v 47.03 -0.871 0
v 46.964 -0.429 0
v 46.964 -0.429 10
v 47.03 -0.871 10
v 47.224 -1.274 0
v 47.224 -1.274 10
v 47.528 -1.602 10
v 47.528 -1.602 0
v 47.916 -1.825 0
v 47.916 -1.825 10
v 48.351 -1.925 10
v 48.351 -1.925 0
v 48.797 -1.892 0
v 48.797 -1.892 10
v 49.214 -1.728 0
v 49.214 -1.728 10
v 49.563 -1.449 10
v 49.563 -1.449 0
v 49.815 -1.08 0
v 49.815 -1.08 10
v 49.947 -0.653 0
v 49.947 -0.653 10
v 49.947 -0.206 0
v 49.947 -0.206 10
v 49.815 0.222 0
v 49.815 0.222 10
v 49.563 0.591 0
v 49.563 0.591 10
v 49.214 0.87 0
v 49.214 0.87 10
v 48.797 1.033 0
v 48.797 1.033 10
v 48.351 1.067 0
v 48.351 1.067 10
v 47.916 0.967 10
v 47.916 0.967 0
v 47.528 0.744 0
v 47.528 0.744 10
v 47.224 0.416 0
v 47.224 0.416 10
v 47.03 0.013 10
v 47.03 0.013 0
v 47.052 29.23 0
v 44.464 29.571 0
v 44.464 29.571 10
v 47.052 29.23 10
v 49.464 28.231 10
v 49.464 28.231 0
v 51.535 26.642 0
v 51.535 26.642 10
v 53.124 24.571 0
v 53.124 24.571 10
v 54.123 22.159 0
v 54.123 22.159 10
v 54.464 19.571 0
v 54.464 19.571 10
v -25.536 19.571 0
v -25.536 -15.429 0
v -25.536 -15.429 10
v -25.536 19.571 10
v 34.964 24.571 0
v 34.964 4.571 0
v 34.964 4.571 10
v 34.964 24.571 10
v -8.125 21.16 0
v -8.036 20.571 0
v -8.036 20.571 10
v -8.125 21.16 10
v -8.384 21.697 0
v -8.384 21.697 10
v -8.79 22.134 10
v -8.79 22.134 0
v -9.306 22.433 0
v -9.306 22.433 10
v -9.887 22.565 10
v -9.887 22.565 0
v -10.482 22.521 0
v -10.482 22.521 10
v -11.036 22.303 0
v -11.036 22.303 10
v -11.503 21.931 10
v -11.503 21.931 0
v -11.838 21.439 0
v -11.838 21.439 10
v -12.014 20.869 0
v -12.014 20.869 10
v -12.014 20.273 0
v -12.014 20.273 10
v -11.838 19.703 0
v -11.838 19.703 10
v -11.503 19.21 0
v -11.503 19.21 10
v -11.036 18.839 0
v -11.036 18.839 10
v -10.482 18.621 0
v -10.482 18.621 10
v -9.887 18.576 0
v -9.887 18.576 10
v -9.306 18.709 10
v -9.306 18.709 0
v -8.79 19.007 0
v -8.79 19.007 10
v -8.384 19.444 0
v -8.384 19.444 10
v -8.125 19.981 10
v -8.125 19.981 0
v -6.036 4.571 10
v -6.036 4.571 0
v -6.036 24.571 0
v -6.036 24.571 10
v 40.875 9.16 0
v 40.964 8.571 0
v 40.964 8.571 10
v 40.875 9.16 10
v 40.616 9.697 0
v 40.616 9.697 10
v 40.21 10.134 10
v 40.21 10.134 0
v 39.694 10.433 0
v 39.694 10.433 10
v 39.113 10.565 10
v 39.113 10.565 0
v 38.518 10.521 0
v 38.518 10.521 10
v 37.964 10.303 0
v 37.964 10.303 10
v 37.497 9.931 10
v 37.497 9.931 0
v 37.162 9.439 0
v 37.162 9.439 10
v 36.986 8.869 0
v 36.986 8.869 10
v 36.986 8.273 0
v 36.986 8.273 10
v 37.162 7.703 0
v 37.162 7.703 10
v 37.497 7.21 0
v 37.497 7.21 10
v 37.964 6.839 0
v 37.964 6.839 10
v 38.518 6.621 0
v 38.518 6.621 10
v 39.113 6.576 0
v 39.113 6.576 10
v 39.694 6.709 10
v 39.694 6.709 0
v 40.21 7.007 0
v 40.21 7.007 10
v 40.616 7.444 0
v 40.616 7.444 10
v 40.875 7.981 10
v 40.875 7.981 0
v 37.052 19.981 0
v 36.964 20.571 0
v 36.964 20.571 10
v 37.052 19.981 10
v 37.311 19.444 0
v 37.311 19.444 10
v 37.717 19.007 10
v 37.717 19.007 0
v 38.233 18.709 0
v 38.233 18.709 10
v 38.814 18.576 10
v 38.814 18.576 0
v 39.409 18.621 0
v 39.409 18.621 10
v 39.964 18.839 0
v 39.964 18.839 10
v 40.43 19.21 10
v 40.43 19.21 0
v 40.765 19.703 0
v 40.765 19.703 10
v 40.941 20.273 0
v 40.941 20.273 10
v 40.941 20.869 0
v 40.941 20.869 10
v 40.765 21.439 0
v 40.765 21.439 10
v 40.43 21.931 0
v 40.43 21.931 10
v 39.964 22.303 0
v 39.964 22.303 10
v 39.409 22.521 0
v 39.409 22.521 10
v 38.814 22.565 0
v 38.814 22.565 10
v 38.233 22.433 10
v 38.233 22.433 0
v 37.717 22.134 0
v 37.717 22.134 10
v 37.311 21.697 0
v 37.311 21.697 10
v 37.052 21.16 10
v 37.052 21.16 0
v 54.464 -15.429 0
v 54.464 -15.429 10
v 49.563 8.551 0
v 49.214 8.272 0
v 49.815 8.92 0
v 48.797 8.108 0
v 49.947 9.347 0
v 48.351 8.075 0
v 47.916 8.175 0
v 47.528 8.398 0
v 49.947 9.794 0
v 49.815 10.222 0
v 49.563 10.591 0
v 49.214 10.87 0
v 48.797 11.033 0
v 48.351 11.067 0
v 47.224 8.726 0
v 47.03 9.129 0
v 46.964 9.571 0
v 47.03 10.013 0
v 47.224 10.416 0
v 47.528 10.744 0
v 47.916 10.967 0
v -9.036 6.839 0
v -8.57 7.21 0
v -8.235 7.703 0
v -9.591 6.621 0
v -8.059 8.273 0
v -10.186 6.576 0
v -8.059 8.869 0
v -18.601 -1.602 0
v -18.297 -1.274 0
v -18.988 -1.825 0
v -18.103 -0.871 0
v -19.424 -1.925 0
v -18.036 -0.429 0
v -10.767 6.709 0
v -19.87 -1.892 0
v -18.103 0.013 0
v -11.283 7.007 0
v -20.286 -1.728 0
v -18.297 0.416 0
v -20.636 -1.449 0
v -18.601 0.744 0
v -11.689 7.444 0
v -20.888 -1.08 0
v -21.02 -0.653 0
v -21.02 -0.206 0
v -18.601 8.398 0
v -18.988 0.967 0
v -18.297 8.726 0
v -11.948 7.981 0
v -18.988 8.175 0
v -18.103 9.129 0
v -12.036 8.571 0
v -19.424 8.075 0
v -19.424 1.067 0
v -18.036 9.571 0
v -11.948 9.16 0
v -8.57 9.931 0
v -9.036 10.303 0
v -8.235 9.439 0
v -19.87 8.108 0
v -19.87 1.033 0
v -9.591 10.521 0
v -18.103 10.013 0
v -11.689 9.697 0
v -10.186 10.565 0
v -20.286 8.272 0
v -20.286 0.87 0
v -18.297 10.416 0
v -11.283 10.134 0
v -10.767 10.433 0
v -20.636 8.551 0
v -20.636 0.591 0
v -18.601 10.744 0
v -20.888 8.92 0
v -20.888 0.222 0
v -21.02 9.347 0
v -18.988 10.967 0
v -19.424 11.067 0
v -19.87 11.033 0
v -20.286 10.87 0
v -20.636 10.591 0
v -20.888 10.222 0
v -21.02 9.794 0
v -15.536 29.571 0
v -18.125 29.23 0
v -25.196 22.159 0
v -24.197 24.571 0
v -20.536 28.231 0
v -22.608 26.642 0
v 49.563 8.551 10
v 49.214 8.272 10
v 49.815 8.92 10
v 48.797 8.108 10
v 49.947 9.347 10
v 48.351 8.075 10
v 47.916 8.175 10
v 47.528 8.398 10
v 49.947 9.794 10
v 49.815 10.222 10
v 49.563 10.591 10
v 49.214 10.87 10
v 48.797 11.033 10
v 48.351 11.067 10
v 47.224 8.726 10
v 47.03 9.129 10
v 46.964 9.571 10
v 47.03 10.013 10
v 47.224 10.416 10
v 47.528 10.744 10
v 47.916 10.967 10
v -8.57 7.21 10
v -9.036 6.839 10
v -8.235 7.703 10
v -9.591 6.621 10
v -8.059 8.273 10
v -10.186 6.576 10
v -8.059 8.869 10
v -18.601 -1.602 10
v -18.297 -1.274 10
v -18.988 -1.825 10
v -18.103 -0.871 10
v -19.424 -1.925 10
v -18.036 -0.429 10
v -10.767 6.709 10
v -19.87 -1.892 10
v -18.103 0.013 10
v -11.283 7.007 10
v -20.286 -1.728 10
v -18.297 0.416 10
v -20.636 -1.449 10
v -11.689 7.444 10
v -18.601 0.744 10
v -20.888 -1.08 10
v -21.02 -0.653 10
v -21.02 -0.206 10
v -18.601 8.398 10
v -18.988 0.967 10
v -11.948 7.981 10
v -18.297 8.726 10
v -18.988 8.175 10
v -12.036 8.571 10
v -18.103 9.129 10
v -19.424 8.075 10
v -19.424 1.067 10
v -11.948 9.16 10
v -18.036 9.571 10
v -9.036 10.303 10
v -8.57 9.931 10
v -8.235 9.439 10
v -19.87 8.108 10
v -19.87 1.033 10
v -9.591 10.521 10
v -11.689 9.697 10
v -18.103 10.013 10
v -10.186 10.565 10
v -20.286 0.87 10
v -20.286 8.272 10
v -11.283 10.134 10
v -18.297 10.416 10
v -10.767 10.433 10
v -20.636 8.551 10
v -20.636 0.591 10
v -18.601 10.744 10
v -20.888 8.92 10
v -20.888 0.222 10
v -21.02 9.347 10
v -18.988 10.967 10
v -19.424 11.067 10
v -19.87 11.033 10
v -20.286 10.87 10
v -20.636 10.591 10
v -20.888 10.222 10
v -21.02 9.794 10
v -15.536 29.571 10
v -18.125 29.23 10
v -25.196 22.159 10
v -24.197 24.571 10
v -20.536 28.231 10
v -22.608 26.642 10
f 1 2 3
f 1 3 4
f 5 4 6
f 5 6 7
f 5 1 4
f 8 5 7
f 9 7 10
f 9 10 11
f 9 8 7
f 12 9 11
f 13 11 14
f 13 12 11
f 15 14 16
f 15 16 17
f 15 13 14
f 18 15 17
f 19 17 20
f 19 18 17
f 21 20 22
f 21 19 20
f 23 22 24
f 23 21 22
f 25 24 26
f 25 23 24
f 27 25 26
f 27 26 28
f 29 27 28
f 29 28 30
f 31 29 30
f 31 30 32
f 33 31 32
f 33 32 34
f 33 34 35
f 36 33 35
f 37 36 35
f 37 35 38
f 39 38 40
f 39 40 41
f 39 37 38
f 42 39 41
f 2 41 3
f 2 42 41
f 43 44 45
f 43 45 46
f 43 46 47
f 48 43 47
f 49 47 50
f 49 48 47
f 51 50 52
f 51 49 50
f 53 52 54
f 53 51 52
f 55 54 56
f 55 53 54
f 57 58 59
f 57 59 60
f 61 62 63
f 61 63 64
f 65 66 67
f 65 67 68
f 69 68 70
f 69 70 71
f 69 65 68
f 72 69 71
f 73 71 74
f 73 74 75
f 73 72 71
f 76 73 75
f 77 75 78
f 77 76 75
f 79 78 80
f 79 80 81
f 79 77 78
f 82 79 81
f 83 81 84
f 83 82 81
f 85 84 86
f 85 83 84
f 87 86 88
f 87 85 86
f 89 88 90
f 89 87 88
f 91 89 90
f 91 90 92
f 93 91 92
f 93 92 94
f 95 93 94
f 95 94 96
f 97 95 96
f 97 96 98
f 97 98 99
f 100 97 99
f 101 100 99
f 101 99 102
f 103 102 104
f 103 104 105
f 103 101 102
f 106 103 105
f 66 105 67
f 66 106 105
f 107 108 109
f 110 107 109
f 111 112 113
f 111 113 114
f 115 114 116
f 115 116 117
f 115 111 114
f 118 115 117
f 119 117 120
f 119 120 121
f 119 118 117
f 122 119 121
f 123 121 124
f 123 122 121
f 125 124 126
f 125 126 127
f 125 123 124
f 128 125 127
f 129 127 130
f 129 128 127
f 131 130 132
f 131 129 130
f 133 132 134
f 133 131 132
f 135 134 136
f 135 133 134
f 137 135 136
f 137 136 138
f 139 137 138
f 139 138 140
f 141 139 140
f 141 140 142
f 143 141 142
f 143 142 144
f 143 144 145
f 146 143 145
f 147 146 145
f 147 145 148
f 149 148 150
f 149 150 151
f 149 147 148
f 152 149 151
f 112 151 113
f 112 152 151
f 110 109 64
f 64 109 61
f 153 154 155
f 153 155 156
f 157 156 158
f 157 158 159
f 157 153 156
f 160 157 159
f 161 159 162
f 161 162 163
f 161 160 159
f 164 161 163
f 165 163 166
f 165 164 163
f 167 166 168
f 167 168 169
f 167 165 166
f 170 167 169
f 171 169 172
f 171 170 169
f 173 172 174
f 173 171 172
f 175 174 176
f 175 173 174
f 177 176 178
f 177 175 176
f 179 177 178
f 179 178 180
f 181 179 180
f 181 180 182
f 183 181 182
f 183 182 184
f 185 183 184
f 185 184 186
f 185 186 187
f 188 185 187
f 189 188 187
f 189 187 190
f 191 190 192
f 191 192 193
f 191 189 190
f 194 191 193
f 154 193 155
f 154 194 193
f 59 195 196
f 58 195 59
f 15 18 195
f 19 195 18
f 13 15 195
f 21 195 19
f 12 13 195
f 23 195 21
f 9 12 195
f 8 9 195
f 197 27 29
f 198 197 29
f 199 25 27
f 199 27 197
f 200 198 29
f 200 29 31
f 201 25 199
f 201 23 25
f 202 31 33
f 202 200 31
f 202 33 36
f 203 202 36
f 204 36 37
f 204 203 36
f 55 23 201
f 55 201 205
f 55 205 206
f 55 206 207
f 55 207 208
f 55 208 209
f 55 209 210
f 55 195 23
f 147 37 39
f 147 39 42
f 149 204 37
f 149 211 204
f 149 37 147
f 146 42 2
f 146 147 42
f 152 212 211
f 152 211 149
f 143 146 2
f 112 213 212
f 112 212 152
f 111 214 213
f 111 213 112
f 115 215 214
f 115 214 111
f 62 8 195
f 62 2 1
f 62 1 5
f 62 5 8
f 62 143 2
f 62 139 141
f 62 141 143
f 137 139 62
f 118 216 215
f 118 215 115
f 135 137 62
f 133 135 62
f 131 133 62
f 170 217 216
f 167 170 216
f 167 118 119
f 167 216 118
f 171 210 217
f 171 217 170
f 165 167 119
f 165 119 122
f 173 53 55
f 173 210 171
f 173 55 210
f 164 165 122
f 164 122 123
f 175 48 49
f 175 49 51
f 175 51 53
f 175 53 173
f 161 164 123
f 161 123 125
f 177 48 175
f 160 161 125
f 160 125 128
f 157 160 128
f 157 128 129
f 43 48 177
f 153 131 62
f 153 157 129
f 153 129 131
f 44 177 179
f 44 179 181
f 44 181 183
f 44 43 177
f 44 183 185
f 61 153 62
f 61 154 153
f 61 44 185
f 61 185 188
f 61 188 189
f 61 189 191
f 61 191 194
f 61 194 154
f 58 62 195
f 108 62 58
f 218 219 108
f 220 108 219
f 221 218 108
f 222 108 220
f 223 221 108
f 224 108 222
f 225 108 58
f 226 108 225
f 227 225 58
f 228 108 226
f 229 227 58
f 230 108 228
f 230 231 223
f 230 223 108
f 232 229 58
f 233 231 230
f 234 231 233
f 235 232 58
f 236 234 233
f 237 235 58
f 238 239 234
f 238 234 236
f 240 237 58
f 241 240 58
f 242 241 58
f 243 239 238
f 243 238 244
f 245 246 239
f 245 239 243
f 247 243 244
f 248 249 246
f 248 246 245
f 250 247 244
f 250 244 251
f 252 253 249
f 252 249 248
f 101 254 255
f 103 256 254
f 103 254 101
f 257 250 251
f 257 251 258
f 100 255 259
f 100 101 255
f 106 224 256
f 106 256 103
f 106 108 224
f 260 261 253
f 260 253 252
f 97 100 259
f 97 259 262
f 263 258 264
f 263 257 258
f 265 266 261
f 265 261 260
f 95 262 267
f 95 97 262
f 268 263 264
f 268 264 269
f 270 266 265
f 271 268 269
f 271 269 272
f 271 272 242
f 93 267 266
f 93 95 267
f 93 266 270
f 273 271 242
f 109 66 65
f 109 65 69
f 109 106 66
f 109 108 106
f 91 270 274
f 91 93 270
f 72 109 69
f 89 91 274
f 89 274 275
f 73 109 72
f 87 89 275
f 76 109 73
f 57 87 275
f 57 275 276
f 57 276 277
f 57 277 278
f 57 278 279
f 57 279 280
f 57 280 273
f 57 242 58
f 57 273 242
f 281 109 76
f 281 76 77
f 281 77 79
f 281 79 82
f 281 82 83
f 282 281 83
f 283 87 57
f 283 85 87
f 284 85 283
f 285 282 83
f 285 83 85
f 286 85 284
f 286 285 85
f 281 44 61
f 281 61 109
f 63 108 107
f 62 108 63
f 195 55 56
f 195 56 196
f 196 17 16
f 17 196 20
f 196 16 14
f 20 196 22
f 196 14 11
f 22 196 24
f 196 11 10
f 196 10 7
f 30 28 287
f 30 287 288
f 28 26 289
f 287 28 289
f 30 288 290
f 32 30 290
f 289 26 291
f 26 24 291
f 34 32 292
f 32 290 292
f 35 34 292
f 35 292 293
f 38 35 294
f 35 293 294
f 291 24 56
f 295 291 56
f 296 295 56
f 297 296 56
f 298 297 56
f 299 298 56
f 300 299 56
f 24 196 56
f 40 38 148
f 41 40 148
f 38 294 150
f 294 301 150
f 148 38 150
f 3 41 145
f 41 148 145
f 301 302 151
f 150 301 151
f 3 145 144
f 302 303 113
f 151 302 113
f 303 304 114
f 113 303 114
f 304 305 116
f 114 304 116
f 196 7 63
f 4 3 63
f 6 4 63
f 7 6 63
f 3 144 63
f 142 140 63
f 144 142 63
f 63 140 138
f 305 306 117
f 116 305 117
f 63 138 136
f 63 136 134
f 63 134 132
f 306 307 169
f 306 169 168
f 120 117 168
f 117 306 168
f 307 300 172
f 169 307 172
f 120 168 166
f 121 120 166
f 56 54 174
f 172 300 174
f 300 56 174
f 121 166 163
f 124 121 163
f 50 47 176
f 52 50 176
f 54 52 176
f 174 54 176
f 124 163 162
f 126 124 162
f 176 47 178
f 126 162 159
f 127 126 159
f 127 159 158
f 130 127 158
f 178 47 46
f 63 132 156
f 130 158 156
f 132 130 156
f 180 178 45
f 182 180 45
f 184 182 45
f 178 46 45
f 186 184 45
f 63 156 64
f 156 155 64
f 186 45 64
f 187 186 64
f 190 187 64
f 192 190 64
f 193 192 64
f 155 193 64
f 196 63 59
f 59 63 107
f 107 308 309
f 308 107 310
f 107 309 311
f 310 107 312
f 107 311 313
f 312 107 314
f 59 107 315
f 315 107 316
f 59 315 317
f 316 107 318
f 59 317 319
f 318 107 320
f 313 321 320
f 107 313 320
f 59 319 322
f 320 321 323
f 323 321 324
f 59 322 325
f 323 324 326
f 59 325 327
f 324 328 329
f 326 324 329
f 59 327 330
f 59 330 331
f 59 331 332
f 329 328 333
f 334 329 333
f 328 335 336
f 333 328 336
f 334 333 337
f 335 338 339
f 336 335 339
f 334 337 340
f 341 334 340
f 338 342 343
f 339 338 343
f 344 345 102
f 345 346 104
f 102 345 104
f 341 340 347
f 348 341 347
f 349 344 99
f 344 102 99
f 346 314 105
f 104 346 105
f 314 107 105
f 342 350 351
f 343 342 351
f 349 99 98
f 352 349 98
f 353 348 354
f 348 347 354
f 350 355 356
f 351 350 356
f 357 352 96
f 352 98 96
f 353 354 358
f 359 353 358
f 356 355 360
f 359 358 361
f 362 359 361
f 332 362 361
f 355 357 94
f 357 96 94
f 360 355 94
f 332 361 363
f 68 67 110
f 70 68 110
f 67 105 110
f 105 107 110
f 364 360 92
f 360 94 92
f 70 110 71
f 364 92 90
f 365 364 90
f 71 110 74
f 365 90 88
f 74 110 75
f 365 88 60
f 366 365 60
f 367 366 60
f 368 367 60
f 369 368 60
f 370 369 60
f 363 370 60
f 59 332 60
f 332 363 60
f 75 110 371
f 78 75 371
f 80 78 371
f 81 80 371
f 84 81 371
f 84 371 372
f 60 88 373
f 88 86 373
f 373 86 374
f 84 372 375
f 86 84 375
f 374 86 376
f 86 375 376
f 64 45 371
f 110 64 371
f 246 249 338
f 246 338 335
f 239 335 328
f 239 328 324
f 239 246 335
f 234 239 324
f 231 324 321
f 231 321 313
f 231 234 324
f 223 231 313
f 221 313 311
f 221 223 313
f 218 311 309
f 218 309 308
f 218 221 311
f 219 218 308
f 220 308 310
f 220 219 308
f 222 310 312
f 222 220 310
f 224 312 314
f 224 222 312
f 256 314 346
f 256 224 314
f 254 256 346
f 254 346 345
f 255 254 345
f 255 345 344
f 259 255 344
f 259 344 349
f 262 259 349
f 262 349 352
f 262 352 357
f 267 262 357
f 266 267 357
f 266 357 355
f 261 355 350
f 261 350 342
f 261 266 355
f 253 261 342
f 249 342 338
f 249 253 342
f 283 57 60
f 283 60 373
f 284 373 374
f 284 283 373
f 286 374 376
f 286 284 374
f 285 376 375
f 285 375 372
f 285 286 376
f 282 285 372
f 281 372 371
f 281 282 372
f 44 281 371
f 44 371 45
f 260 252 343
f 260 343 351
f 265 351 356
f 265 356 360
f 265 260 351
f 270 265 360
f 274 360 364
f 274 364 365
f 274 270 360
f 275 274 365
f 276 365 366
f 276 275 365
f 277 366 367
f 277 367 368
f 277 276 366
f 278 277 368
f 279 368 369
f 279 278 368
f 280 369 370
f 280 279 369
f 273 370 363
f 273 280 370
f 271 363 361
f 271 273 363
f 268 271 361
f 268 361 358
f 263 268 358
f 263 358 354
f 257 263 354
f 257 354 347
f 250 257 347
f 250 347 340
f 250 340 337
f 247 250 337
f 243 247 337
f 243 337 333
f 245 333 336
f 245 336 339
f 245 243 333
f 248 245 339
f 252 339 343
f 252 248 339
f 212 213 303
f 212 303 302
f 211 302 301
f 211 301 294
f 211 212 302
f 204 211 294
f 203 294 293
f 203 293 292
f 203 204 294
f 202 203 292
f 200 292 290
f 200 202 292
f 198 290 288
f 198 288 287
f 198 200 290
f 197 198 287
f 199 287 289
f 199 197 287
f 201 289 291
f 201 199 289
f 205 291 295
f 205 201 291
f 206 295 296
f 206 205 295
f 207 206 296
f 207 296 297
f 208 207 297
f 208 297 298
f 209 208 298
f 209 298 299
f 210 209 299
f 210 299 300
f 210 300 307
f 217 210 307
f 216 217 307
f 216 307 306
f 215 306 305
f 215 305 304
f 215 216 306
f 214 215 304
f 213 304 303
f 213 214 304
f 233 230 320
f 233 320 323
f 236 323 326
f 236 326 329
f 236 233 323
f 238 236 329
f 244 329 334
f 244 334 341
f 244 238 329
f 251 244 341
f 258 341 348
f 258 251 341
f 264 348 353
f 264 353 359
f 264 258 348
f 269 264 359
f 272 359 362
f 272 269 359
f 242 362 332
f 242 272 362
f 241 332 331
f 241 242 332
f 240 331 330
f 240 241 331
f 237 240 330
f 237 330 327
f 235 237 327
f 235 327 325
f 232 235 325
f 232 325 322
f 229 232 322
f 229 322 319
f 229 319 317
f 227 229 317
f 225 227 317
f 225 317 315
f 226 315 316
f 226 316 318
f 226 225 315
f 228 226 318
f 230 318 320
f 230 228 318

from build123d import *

# Parameters (mm, degrees)
SKETCH1_R           = 2
SKETCH1_R_2         = 1.5
SKETCH1_W           = 41
SKETCH1_H           = 20
BOSS_EXTRUDE1_DEPTH = 10


with BuildPart() as part:
    # Sketch1 → Boss-Extrude1 (new body)
    with BuildSketch(Plane.XY):
        with BuildLine():
            Line((-15.536480687, 29.570815451), (44.463519313, 29.570815451))
            ThreePointArc((44.463519313, 29.570815451), (51.534587125, 26.641883263), (54.463519313, 19.570815451))
            Line((54.463519313, 19.570815451), (54.463519313, -15.429184549))
            Line((54.463519313, -15.429184549), (-25.536480687, -15.429184549))
            Line((-25.536480687, -15.429184549), (-25.536480687, 19.570815451))
            ThreePointArc((-25.536480687, 19.570815451), (-22.607548499, 26.641883263), (-15.536480687, 29.570815451))
        make_face()
        with Locations((-10.036480687, 20.570815451)):
            Circle(SKETCH1_R, mode=Mode.SUBTRACT)
        with Locations((38.963519313, 8.570815451)):
            Circle(SKETCH1_R, mode=Mode.SUBTRACT)
        with Locations(Location((-10.036480687, 8.570815451, 0), (0, 0, 180))):
            Circle(SKETCH1_R, mode=Mode.SUBTRACT)
        with Locations(Location((38.963519313, 20.570815451, 0), (0, 0, 180))):
            Circle(SKETCH1_R, mode=Mode.SUBTRACT)
        with Locations((-19.536480687, -0.429184549)):
            Circle(SKETCH1_R_2, mode=Mode.SUBTRACT)
        with Locations((-19.536480687, 9.570815451)):
            Circle(SKETCH1_R_2, mode=Mode.SUBTRACT)
        with Locations(Location((48.463519313, 9.570815451, 0), (0, 0, 180))):
            Circle(SKETCH1_R_2, mode=Mode.SUBTRACT)
        with Locations(Location((48.463519313, -0.429184549, 0), (0, 0, 180))):
            Circle(SKETCH1_R_2, mode=Mode.SUBTRACT)
        with Locations((14.463519313, 14.570815451)):
            Rectangle(SKETCH1_W, SKETCH1_H, mode=Mode.SUBTRACT)
    extrude(amount=BOSS_EXTRUDE1_DEPTH)


solid = part.part
